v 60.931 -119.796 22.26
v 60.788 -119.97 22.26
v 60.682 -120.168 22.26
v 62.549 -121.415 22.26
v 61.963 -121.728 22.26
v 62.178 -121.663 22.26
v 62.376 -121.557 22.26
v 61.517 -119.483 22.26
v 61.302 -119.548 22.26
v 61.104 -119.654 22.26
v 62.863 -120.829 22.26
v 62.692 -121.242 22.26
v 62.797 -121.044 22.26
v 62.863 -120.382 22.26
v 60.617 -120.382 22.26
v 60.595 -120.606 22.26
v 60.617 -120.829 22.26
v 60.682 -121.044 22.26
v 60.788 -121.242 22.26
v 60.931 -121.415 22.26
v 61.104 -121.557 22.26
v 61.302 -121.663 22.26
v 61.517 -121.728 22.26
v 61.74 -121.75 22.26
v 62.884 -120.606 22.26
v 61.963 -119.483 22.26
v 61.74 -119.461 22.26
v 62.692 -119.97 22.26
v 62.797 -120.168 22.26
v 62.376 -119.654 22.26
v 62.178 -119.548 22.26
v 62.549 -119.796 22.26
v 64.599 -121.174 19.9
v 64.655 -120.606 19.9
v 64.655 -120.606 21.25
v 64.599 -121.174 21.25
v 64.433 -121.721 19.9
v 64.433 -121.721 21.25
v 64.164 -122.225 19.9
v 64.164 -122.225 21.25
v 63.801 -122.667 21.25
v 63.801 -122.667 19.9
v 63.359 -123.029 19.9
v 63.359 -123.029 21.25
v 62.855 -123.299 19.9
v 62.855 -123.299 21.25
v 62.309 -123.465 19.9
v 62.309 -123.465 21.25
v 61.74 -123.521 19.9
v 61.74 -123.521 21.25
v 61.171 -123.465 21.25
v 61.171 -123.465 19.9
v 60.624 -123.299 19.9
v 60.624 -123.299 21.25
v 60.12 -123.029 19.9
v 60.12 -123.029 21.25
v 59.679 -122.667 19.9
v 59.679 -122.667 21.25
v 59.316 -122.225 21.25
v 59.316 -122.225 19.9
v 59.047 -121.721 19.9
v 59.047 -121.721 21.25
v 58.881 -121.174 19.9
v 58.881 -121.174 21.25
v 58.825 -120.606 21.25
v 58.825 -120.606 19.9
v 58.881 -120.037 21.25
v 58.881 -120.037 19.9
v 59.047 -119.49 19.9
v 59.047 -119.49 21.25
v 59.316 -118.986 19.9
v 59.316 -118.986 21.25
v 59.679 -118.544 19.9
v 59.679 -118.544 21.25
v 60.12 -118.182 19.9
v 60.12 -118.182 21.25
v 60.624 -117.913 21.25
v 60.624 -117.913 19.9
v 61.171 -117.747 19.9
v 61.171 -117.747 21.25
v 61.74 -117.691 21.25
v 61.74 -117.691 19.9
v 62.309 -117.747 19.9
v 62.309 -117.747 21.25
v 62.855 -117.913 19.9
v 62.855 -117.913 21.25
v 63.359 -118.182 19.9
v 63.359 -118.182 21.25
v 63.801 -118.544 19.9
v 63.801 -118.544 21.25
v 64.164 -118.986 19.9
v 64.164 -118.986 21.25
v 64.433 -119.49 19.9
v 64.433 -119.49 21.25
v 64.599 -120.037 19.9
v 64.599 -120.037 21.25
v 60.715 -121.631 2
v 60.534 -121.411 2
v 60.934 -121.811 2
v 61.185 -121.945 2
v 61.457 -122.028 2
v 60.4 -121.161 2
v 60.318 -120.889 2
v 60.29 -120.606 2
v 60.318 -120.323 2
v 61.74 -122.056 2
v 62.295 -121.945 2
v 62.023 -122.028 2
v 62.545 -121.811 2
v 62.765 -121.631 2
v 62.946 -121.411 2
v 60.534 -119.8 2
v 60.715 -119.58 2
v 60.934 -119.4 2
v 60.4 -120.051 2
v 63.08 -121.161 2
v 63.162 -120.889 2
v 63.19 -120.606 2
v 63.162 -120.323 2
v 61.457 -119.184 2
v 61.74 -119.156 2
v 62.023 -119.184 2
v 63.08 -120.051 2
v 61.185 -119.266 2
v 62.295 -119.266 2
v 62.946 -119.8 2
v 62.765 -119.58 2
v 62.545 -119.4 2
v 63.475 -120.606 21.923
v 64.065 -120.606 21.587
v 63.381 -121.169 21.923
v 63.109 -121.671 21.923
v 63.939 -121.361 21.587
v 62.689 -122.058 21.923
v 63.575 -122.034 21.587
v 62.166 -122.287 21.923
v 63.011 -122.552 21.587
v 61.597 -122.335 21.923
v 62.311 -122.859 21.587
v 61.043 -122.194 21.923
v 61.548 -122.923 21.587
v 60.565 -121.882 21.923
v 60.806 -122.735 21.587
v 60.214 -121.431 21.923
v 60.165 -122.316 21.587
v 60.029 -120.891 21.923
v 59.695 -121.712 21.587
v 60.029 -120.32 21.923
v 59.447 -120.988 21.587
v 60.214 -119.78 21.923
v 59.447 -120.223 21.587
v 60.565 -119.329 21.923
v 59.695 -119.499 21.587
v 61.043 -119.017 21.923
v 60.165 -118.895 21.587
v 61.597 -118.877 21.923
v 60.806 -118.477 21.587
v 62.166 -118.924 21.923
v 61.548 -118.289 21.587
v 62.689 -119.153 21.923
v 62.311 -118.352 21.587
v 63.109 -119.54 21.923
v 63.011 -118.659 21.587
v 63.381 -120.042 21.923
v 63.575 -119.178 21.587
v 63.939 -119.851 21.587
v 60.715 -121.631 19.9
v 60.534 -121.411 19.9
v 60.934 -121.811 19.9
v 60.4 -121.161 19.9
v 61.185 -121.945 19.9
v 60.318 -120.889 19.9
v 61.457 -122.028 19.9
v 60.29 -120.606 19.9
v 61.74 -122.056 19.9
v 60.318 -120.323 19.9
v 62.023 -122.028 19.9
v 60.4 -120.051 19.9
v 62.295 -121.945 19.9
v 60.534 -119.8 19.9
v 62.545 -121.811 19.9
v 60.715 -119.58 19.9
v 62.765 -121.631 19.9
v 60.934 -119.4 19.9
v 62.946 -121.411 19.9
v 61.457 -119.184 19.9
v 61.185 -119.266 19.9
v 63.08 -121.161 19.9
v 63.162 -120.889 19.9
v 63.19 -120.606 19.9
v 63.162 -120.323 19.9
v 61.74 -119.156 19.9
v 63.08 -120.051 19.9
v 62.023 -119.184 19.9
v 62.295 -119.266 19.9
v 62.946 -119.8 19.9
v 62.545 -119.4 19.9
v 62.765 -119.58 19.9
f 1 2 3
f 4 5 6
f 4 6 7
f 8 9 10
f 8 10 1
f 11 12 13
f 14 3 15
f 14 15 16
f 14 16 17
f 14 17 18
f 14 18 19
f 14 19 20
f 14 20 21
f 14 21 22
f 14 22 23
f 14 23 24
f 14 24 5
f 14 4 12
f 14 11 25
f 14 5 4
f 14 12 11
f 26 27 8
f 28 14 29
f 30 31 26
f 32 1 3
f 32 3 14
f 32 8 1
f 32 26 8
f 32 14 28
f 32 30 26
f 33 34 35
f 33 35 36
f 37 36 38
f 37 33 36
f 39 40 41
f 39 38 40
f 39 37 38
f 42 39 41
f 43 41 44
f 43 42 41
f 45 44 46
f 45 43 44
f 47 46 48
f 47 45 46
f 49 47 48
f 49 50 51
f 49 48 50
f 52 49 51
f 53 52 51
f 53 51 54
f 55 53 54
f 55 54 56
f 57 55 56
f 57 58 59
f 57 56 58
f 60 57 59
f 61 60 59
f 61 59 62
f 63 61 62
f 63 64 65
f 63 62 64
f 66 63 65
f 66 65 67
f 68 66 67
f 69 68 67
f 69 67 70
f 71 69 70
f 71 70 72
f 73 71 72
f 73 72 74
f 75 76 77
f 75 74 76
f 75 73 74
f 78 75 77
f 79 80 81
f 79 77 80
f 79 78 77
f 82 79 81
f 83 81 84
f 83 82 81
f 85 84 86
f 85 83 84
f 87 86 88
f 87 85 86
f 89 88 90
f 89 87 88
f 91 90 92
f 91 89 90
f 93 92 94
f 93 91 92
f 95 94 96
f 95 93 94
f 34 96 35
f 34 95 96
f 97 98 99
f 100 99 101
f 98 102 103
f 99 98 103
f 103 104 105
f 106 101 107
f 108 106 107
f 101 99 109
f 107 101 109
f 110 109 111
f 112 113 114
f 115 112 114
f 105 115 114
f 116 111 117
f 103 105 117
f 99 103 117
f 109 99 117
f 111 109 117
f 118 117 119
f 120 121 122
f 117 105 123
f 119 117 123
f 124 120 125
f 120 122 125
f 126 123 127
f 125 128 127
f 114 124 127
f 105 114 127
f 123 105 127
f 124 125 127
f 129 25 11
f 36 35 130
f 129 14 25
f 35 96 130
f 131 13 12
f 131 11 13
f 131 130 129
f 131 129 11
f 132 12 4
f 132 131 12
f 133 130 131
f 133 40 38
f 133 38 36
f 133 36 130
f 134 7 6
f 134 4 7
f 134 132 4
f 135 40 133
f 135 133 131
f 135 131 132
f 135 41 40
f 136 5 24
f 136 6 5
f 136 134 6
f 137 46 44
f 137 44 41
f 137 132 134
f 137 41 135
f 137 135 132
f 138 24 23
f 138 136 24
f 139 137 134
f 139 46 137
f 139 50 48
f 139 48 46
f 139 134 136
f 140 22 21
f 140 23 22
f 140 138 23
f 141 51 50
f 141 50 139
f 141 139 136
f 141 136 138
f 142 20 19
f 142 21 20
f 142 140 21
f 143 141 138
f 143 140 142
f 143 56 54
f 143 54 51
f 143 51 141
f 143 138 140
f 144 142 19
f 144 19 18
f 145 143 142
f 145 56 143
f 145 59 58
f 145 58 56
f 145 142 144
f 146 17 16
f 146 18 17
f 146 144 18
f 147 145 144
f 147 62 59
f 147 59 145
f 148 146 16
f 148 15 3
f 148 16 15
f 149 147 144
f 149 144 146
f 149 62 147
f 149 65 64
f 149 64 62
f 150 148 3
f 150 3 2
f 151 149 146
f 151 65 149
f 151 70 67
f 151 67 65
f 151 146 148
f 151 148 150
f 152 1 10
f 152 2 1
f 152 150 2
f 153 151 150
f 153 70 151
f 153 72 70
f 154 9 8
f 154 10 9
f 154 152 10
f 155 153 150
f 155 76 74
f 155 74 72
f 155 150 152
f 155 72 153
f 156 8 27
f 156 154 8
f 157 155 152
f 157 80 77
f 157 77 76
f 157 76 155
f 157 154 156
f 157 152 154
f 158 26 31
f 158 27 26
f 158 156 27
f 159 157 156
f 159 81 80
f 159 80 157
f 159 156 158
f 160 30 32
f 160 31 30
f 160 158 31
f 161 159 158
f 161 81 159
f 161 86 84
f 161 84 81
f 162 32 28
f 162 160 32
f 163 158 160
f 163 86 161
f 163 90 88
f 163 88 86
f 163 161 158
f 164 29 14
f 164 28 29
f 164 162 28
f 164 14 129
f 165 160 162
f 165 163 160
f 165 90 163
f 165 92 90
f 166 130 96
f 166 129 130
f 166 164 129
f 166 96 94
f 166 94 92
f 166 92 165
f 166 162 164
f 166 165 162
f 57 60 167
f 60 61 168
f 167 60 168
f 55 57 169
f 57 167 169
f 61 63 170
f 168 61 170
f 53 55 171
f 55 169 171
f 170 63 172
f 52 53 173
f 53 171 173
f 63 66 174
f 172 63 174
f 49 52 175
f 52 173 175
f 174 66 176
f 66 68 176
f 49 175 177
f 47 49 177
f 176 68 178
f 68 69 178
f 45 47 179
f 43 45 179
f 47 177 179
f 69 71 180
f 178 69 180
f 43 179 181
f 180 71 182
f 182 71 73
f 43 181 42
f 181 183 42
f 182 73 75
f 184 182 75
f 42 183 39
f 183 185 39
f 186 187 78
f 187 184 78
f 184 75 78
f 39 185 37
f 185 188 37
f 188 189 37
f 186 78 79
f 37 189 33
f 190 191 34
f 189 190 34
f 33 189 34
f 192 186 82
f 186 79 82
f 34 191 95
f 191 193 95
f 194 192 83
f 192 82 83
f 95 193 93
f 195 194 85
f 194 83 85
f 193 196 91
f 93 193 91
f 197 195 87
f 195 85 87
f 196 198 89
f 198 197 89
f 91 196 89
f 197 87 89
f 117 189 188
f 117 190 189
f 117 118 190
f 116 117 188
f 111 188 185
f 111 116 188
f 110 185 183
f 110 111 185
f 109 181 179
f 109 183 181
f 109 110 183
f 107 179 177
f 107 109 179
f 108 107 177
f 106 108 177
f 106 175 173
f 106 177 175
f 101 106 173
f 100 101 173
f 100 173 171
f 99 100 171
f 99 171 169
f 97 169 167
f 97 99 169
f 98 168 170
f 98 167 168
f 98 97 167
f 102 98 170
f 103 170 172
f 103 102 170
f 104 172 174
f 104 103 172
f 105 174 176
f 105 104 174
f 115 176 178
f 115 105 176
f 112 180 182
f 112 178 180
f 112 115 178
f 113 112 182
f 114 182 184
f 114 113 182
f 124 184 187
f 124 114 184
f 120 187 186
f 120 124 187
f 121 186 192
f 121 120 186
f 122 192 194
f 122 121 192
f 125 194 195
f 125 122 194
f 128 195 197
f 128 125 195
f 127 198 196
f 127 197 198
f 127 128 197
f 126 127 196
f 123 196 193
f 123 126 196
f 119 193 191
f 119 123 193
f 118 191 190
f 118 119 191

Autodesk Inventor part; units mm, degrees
ref_plane "YZ Plane" through (0, 0, 0) normal (1, 0, 0) x (0, 1, 0)
ref_plane "XZ Plane" through (0, 0, 0) normal (0, 1, 0) x (-1, 0, 0)
ref_plane "XY Plane" through (0, 0, 0) normal (0, 0, 1) x (1, 0, 0)
ref_plane "Work Plane1" through (29.0854, -74.8946, 2) normal (0, 0, 1) x (1, 0, 0)
sketch "Sketch1" plane through (29.0854, -74.8946, 2) normal (0, 0, 1) x (1, 0, 0)
  line L0 (19.0856, -32.3111) -> (19.0856, -42.3111) projected
  line L1 (29.0856, -32.3111) -> (19.0856, -32.3111) projected
  line L2 (29.0856, -42.3111) -> (29.0856, -32.3111) projected
  line L3 (19.0856, -42.3111) -> (29.0856, -42.3111) projected
  circle A0 centre (32.6545, -45.7111) radius 1.45
  point P0 (-29.0854, 74.8946)
  dimension "d1" = 2.9
extrude "Extrusion1" add sketch "Sketch1" along normal blind 17.9 contours A0
sketch "Sketch2" plane through (61.7399, -120.6057, 19.9) normal (0, 0, 1) x (1, 0, 0)
  circle A0 centre (0, 0) radius 1.45 projected
  circle A1 centre (0, 0) radius 2.915
  point P0 (-61.7399, 120.6057)
  dimension "d4" = 5.83
extrude "Extrusion2" add sketch "Sketch2" along normal blind 1.35 contours A0 | A1
ref_plane "Work Plane2" through (61.7399, -120.6057, 22.26) normal (0, 0, 1) x (1, 0, 0)
sketch "Sketch3" plane through (61.7399, -120.6057, 22.26) normal (0, 0, 1) x (1, 0, 0)
  circle A0 centre (0, 0) radius 1.45 construction
  circle A1 centre (0, 0) radius 1.1446
  point P0 (-61.7399, 120.6057)
loft "Loft1" add profiles "Sketch3" section 1 edges at (58.8249, -120.6057, 21.25)
ref_plane "Work Plane3" through (61.7399, -120.6057, 19.9) normal (0, 0, -1) x (-1, 0, 0)
properties part number "screw"
